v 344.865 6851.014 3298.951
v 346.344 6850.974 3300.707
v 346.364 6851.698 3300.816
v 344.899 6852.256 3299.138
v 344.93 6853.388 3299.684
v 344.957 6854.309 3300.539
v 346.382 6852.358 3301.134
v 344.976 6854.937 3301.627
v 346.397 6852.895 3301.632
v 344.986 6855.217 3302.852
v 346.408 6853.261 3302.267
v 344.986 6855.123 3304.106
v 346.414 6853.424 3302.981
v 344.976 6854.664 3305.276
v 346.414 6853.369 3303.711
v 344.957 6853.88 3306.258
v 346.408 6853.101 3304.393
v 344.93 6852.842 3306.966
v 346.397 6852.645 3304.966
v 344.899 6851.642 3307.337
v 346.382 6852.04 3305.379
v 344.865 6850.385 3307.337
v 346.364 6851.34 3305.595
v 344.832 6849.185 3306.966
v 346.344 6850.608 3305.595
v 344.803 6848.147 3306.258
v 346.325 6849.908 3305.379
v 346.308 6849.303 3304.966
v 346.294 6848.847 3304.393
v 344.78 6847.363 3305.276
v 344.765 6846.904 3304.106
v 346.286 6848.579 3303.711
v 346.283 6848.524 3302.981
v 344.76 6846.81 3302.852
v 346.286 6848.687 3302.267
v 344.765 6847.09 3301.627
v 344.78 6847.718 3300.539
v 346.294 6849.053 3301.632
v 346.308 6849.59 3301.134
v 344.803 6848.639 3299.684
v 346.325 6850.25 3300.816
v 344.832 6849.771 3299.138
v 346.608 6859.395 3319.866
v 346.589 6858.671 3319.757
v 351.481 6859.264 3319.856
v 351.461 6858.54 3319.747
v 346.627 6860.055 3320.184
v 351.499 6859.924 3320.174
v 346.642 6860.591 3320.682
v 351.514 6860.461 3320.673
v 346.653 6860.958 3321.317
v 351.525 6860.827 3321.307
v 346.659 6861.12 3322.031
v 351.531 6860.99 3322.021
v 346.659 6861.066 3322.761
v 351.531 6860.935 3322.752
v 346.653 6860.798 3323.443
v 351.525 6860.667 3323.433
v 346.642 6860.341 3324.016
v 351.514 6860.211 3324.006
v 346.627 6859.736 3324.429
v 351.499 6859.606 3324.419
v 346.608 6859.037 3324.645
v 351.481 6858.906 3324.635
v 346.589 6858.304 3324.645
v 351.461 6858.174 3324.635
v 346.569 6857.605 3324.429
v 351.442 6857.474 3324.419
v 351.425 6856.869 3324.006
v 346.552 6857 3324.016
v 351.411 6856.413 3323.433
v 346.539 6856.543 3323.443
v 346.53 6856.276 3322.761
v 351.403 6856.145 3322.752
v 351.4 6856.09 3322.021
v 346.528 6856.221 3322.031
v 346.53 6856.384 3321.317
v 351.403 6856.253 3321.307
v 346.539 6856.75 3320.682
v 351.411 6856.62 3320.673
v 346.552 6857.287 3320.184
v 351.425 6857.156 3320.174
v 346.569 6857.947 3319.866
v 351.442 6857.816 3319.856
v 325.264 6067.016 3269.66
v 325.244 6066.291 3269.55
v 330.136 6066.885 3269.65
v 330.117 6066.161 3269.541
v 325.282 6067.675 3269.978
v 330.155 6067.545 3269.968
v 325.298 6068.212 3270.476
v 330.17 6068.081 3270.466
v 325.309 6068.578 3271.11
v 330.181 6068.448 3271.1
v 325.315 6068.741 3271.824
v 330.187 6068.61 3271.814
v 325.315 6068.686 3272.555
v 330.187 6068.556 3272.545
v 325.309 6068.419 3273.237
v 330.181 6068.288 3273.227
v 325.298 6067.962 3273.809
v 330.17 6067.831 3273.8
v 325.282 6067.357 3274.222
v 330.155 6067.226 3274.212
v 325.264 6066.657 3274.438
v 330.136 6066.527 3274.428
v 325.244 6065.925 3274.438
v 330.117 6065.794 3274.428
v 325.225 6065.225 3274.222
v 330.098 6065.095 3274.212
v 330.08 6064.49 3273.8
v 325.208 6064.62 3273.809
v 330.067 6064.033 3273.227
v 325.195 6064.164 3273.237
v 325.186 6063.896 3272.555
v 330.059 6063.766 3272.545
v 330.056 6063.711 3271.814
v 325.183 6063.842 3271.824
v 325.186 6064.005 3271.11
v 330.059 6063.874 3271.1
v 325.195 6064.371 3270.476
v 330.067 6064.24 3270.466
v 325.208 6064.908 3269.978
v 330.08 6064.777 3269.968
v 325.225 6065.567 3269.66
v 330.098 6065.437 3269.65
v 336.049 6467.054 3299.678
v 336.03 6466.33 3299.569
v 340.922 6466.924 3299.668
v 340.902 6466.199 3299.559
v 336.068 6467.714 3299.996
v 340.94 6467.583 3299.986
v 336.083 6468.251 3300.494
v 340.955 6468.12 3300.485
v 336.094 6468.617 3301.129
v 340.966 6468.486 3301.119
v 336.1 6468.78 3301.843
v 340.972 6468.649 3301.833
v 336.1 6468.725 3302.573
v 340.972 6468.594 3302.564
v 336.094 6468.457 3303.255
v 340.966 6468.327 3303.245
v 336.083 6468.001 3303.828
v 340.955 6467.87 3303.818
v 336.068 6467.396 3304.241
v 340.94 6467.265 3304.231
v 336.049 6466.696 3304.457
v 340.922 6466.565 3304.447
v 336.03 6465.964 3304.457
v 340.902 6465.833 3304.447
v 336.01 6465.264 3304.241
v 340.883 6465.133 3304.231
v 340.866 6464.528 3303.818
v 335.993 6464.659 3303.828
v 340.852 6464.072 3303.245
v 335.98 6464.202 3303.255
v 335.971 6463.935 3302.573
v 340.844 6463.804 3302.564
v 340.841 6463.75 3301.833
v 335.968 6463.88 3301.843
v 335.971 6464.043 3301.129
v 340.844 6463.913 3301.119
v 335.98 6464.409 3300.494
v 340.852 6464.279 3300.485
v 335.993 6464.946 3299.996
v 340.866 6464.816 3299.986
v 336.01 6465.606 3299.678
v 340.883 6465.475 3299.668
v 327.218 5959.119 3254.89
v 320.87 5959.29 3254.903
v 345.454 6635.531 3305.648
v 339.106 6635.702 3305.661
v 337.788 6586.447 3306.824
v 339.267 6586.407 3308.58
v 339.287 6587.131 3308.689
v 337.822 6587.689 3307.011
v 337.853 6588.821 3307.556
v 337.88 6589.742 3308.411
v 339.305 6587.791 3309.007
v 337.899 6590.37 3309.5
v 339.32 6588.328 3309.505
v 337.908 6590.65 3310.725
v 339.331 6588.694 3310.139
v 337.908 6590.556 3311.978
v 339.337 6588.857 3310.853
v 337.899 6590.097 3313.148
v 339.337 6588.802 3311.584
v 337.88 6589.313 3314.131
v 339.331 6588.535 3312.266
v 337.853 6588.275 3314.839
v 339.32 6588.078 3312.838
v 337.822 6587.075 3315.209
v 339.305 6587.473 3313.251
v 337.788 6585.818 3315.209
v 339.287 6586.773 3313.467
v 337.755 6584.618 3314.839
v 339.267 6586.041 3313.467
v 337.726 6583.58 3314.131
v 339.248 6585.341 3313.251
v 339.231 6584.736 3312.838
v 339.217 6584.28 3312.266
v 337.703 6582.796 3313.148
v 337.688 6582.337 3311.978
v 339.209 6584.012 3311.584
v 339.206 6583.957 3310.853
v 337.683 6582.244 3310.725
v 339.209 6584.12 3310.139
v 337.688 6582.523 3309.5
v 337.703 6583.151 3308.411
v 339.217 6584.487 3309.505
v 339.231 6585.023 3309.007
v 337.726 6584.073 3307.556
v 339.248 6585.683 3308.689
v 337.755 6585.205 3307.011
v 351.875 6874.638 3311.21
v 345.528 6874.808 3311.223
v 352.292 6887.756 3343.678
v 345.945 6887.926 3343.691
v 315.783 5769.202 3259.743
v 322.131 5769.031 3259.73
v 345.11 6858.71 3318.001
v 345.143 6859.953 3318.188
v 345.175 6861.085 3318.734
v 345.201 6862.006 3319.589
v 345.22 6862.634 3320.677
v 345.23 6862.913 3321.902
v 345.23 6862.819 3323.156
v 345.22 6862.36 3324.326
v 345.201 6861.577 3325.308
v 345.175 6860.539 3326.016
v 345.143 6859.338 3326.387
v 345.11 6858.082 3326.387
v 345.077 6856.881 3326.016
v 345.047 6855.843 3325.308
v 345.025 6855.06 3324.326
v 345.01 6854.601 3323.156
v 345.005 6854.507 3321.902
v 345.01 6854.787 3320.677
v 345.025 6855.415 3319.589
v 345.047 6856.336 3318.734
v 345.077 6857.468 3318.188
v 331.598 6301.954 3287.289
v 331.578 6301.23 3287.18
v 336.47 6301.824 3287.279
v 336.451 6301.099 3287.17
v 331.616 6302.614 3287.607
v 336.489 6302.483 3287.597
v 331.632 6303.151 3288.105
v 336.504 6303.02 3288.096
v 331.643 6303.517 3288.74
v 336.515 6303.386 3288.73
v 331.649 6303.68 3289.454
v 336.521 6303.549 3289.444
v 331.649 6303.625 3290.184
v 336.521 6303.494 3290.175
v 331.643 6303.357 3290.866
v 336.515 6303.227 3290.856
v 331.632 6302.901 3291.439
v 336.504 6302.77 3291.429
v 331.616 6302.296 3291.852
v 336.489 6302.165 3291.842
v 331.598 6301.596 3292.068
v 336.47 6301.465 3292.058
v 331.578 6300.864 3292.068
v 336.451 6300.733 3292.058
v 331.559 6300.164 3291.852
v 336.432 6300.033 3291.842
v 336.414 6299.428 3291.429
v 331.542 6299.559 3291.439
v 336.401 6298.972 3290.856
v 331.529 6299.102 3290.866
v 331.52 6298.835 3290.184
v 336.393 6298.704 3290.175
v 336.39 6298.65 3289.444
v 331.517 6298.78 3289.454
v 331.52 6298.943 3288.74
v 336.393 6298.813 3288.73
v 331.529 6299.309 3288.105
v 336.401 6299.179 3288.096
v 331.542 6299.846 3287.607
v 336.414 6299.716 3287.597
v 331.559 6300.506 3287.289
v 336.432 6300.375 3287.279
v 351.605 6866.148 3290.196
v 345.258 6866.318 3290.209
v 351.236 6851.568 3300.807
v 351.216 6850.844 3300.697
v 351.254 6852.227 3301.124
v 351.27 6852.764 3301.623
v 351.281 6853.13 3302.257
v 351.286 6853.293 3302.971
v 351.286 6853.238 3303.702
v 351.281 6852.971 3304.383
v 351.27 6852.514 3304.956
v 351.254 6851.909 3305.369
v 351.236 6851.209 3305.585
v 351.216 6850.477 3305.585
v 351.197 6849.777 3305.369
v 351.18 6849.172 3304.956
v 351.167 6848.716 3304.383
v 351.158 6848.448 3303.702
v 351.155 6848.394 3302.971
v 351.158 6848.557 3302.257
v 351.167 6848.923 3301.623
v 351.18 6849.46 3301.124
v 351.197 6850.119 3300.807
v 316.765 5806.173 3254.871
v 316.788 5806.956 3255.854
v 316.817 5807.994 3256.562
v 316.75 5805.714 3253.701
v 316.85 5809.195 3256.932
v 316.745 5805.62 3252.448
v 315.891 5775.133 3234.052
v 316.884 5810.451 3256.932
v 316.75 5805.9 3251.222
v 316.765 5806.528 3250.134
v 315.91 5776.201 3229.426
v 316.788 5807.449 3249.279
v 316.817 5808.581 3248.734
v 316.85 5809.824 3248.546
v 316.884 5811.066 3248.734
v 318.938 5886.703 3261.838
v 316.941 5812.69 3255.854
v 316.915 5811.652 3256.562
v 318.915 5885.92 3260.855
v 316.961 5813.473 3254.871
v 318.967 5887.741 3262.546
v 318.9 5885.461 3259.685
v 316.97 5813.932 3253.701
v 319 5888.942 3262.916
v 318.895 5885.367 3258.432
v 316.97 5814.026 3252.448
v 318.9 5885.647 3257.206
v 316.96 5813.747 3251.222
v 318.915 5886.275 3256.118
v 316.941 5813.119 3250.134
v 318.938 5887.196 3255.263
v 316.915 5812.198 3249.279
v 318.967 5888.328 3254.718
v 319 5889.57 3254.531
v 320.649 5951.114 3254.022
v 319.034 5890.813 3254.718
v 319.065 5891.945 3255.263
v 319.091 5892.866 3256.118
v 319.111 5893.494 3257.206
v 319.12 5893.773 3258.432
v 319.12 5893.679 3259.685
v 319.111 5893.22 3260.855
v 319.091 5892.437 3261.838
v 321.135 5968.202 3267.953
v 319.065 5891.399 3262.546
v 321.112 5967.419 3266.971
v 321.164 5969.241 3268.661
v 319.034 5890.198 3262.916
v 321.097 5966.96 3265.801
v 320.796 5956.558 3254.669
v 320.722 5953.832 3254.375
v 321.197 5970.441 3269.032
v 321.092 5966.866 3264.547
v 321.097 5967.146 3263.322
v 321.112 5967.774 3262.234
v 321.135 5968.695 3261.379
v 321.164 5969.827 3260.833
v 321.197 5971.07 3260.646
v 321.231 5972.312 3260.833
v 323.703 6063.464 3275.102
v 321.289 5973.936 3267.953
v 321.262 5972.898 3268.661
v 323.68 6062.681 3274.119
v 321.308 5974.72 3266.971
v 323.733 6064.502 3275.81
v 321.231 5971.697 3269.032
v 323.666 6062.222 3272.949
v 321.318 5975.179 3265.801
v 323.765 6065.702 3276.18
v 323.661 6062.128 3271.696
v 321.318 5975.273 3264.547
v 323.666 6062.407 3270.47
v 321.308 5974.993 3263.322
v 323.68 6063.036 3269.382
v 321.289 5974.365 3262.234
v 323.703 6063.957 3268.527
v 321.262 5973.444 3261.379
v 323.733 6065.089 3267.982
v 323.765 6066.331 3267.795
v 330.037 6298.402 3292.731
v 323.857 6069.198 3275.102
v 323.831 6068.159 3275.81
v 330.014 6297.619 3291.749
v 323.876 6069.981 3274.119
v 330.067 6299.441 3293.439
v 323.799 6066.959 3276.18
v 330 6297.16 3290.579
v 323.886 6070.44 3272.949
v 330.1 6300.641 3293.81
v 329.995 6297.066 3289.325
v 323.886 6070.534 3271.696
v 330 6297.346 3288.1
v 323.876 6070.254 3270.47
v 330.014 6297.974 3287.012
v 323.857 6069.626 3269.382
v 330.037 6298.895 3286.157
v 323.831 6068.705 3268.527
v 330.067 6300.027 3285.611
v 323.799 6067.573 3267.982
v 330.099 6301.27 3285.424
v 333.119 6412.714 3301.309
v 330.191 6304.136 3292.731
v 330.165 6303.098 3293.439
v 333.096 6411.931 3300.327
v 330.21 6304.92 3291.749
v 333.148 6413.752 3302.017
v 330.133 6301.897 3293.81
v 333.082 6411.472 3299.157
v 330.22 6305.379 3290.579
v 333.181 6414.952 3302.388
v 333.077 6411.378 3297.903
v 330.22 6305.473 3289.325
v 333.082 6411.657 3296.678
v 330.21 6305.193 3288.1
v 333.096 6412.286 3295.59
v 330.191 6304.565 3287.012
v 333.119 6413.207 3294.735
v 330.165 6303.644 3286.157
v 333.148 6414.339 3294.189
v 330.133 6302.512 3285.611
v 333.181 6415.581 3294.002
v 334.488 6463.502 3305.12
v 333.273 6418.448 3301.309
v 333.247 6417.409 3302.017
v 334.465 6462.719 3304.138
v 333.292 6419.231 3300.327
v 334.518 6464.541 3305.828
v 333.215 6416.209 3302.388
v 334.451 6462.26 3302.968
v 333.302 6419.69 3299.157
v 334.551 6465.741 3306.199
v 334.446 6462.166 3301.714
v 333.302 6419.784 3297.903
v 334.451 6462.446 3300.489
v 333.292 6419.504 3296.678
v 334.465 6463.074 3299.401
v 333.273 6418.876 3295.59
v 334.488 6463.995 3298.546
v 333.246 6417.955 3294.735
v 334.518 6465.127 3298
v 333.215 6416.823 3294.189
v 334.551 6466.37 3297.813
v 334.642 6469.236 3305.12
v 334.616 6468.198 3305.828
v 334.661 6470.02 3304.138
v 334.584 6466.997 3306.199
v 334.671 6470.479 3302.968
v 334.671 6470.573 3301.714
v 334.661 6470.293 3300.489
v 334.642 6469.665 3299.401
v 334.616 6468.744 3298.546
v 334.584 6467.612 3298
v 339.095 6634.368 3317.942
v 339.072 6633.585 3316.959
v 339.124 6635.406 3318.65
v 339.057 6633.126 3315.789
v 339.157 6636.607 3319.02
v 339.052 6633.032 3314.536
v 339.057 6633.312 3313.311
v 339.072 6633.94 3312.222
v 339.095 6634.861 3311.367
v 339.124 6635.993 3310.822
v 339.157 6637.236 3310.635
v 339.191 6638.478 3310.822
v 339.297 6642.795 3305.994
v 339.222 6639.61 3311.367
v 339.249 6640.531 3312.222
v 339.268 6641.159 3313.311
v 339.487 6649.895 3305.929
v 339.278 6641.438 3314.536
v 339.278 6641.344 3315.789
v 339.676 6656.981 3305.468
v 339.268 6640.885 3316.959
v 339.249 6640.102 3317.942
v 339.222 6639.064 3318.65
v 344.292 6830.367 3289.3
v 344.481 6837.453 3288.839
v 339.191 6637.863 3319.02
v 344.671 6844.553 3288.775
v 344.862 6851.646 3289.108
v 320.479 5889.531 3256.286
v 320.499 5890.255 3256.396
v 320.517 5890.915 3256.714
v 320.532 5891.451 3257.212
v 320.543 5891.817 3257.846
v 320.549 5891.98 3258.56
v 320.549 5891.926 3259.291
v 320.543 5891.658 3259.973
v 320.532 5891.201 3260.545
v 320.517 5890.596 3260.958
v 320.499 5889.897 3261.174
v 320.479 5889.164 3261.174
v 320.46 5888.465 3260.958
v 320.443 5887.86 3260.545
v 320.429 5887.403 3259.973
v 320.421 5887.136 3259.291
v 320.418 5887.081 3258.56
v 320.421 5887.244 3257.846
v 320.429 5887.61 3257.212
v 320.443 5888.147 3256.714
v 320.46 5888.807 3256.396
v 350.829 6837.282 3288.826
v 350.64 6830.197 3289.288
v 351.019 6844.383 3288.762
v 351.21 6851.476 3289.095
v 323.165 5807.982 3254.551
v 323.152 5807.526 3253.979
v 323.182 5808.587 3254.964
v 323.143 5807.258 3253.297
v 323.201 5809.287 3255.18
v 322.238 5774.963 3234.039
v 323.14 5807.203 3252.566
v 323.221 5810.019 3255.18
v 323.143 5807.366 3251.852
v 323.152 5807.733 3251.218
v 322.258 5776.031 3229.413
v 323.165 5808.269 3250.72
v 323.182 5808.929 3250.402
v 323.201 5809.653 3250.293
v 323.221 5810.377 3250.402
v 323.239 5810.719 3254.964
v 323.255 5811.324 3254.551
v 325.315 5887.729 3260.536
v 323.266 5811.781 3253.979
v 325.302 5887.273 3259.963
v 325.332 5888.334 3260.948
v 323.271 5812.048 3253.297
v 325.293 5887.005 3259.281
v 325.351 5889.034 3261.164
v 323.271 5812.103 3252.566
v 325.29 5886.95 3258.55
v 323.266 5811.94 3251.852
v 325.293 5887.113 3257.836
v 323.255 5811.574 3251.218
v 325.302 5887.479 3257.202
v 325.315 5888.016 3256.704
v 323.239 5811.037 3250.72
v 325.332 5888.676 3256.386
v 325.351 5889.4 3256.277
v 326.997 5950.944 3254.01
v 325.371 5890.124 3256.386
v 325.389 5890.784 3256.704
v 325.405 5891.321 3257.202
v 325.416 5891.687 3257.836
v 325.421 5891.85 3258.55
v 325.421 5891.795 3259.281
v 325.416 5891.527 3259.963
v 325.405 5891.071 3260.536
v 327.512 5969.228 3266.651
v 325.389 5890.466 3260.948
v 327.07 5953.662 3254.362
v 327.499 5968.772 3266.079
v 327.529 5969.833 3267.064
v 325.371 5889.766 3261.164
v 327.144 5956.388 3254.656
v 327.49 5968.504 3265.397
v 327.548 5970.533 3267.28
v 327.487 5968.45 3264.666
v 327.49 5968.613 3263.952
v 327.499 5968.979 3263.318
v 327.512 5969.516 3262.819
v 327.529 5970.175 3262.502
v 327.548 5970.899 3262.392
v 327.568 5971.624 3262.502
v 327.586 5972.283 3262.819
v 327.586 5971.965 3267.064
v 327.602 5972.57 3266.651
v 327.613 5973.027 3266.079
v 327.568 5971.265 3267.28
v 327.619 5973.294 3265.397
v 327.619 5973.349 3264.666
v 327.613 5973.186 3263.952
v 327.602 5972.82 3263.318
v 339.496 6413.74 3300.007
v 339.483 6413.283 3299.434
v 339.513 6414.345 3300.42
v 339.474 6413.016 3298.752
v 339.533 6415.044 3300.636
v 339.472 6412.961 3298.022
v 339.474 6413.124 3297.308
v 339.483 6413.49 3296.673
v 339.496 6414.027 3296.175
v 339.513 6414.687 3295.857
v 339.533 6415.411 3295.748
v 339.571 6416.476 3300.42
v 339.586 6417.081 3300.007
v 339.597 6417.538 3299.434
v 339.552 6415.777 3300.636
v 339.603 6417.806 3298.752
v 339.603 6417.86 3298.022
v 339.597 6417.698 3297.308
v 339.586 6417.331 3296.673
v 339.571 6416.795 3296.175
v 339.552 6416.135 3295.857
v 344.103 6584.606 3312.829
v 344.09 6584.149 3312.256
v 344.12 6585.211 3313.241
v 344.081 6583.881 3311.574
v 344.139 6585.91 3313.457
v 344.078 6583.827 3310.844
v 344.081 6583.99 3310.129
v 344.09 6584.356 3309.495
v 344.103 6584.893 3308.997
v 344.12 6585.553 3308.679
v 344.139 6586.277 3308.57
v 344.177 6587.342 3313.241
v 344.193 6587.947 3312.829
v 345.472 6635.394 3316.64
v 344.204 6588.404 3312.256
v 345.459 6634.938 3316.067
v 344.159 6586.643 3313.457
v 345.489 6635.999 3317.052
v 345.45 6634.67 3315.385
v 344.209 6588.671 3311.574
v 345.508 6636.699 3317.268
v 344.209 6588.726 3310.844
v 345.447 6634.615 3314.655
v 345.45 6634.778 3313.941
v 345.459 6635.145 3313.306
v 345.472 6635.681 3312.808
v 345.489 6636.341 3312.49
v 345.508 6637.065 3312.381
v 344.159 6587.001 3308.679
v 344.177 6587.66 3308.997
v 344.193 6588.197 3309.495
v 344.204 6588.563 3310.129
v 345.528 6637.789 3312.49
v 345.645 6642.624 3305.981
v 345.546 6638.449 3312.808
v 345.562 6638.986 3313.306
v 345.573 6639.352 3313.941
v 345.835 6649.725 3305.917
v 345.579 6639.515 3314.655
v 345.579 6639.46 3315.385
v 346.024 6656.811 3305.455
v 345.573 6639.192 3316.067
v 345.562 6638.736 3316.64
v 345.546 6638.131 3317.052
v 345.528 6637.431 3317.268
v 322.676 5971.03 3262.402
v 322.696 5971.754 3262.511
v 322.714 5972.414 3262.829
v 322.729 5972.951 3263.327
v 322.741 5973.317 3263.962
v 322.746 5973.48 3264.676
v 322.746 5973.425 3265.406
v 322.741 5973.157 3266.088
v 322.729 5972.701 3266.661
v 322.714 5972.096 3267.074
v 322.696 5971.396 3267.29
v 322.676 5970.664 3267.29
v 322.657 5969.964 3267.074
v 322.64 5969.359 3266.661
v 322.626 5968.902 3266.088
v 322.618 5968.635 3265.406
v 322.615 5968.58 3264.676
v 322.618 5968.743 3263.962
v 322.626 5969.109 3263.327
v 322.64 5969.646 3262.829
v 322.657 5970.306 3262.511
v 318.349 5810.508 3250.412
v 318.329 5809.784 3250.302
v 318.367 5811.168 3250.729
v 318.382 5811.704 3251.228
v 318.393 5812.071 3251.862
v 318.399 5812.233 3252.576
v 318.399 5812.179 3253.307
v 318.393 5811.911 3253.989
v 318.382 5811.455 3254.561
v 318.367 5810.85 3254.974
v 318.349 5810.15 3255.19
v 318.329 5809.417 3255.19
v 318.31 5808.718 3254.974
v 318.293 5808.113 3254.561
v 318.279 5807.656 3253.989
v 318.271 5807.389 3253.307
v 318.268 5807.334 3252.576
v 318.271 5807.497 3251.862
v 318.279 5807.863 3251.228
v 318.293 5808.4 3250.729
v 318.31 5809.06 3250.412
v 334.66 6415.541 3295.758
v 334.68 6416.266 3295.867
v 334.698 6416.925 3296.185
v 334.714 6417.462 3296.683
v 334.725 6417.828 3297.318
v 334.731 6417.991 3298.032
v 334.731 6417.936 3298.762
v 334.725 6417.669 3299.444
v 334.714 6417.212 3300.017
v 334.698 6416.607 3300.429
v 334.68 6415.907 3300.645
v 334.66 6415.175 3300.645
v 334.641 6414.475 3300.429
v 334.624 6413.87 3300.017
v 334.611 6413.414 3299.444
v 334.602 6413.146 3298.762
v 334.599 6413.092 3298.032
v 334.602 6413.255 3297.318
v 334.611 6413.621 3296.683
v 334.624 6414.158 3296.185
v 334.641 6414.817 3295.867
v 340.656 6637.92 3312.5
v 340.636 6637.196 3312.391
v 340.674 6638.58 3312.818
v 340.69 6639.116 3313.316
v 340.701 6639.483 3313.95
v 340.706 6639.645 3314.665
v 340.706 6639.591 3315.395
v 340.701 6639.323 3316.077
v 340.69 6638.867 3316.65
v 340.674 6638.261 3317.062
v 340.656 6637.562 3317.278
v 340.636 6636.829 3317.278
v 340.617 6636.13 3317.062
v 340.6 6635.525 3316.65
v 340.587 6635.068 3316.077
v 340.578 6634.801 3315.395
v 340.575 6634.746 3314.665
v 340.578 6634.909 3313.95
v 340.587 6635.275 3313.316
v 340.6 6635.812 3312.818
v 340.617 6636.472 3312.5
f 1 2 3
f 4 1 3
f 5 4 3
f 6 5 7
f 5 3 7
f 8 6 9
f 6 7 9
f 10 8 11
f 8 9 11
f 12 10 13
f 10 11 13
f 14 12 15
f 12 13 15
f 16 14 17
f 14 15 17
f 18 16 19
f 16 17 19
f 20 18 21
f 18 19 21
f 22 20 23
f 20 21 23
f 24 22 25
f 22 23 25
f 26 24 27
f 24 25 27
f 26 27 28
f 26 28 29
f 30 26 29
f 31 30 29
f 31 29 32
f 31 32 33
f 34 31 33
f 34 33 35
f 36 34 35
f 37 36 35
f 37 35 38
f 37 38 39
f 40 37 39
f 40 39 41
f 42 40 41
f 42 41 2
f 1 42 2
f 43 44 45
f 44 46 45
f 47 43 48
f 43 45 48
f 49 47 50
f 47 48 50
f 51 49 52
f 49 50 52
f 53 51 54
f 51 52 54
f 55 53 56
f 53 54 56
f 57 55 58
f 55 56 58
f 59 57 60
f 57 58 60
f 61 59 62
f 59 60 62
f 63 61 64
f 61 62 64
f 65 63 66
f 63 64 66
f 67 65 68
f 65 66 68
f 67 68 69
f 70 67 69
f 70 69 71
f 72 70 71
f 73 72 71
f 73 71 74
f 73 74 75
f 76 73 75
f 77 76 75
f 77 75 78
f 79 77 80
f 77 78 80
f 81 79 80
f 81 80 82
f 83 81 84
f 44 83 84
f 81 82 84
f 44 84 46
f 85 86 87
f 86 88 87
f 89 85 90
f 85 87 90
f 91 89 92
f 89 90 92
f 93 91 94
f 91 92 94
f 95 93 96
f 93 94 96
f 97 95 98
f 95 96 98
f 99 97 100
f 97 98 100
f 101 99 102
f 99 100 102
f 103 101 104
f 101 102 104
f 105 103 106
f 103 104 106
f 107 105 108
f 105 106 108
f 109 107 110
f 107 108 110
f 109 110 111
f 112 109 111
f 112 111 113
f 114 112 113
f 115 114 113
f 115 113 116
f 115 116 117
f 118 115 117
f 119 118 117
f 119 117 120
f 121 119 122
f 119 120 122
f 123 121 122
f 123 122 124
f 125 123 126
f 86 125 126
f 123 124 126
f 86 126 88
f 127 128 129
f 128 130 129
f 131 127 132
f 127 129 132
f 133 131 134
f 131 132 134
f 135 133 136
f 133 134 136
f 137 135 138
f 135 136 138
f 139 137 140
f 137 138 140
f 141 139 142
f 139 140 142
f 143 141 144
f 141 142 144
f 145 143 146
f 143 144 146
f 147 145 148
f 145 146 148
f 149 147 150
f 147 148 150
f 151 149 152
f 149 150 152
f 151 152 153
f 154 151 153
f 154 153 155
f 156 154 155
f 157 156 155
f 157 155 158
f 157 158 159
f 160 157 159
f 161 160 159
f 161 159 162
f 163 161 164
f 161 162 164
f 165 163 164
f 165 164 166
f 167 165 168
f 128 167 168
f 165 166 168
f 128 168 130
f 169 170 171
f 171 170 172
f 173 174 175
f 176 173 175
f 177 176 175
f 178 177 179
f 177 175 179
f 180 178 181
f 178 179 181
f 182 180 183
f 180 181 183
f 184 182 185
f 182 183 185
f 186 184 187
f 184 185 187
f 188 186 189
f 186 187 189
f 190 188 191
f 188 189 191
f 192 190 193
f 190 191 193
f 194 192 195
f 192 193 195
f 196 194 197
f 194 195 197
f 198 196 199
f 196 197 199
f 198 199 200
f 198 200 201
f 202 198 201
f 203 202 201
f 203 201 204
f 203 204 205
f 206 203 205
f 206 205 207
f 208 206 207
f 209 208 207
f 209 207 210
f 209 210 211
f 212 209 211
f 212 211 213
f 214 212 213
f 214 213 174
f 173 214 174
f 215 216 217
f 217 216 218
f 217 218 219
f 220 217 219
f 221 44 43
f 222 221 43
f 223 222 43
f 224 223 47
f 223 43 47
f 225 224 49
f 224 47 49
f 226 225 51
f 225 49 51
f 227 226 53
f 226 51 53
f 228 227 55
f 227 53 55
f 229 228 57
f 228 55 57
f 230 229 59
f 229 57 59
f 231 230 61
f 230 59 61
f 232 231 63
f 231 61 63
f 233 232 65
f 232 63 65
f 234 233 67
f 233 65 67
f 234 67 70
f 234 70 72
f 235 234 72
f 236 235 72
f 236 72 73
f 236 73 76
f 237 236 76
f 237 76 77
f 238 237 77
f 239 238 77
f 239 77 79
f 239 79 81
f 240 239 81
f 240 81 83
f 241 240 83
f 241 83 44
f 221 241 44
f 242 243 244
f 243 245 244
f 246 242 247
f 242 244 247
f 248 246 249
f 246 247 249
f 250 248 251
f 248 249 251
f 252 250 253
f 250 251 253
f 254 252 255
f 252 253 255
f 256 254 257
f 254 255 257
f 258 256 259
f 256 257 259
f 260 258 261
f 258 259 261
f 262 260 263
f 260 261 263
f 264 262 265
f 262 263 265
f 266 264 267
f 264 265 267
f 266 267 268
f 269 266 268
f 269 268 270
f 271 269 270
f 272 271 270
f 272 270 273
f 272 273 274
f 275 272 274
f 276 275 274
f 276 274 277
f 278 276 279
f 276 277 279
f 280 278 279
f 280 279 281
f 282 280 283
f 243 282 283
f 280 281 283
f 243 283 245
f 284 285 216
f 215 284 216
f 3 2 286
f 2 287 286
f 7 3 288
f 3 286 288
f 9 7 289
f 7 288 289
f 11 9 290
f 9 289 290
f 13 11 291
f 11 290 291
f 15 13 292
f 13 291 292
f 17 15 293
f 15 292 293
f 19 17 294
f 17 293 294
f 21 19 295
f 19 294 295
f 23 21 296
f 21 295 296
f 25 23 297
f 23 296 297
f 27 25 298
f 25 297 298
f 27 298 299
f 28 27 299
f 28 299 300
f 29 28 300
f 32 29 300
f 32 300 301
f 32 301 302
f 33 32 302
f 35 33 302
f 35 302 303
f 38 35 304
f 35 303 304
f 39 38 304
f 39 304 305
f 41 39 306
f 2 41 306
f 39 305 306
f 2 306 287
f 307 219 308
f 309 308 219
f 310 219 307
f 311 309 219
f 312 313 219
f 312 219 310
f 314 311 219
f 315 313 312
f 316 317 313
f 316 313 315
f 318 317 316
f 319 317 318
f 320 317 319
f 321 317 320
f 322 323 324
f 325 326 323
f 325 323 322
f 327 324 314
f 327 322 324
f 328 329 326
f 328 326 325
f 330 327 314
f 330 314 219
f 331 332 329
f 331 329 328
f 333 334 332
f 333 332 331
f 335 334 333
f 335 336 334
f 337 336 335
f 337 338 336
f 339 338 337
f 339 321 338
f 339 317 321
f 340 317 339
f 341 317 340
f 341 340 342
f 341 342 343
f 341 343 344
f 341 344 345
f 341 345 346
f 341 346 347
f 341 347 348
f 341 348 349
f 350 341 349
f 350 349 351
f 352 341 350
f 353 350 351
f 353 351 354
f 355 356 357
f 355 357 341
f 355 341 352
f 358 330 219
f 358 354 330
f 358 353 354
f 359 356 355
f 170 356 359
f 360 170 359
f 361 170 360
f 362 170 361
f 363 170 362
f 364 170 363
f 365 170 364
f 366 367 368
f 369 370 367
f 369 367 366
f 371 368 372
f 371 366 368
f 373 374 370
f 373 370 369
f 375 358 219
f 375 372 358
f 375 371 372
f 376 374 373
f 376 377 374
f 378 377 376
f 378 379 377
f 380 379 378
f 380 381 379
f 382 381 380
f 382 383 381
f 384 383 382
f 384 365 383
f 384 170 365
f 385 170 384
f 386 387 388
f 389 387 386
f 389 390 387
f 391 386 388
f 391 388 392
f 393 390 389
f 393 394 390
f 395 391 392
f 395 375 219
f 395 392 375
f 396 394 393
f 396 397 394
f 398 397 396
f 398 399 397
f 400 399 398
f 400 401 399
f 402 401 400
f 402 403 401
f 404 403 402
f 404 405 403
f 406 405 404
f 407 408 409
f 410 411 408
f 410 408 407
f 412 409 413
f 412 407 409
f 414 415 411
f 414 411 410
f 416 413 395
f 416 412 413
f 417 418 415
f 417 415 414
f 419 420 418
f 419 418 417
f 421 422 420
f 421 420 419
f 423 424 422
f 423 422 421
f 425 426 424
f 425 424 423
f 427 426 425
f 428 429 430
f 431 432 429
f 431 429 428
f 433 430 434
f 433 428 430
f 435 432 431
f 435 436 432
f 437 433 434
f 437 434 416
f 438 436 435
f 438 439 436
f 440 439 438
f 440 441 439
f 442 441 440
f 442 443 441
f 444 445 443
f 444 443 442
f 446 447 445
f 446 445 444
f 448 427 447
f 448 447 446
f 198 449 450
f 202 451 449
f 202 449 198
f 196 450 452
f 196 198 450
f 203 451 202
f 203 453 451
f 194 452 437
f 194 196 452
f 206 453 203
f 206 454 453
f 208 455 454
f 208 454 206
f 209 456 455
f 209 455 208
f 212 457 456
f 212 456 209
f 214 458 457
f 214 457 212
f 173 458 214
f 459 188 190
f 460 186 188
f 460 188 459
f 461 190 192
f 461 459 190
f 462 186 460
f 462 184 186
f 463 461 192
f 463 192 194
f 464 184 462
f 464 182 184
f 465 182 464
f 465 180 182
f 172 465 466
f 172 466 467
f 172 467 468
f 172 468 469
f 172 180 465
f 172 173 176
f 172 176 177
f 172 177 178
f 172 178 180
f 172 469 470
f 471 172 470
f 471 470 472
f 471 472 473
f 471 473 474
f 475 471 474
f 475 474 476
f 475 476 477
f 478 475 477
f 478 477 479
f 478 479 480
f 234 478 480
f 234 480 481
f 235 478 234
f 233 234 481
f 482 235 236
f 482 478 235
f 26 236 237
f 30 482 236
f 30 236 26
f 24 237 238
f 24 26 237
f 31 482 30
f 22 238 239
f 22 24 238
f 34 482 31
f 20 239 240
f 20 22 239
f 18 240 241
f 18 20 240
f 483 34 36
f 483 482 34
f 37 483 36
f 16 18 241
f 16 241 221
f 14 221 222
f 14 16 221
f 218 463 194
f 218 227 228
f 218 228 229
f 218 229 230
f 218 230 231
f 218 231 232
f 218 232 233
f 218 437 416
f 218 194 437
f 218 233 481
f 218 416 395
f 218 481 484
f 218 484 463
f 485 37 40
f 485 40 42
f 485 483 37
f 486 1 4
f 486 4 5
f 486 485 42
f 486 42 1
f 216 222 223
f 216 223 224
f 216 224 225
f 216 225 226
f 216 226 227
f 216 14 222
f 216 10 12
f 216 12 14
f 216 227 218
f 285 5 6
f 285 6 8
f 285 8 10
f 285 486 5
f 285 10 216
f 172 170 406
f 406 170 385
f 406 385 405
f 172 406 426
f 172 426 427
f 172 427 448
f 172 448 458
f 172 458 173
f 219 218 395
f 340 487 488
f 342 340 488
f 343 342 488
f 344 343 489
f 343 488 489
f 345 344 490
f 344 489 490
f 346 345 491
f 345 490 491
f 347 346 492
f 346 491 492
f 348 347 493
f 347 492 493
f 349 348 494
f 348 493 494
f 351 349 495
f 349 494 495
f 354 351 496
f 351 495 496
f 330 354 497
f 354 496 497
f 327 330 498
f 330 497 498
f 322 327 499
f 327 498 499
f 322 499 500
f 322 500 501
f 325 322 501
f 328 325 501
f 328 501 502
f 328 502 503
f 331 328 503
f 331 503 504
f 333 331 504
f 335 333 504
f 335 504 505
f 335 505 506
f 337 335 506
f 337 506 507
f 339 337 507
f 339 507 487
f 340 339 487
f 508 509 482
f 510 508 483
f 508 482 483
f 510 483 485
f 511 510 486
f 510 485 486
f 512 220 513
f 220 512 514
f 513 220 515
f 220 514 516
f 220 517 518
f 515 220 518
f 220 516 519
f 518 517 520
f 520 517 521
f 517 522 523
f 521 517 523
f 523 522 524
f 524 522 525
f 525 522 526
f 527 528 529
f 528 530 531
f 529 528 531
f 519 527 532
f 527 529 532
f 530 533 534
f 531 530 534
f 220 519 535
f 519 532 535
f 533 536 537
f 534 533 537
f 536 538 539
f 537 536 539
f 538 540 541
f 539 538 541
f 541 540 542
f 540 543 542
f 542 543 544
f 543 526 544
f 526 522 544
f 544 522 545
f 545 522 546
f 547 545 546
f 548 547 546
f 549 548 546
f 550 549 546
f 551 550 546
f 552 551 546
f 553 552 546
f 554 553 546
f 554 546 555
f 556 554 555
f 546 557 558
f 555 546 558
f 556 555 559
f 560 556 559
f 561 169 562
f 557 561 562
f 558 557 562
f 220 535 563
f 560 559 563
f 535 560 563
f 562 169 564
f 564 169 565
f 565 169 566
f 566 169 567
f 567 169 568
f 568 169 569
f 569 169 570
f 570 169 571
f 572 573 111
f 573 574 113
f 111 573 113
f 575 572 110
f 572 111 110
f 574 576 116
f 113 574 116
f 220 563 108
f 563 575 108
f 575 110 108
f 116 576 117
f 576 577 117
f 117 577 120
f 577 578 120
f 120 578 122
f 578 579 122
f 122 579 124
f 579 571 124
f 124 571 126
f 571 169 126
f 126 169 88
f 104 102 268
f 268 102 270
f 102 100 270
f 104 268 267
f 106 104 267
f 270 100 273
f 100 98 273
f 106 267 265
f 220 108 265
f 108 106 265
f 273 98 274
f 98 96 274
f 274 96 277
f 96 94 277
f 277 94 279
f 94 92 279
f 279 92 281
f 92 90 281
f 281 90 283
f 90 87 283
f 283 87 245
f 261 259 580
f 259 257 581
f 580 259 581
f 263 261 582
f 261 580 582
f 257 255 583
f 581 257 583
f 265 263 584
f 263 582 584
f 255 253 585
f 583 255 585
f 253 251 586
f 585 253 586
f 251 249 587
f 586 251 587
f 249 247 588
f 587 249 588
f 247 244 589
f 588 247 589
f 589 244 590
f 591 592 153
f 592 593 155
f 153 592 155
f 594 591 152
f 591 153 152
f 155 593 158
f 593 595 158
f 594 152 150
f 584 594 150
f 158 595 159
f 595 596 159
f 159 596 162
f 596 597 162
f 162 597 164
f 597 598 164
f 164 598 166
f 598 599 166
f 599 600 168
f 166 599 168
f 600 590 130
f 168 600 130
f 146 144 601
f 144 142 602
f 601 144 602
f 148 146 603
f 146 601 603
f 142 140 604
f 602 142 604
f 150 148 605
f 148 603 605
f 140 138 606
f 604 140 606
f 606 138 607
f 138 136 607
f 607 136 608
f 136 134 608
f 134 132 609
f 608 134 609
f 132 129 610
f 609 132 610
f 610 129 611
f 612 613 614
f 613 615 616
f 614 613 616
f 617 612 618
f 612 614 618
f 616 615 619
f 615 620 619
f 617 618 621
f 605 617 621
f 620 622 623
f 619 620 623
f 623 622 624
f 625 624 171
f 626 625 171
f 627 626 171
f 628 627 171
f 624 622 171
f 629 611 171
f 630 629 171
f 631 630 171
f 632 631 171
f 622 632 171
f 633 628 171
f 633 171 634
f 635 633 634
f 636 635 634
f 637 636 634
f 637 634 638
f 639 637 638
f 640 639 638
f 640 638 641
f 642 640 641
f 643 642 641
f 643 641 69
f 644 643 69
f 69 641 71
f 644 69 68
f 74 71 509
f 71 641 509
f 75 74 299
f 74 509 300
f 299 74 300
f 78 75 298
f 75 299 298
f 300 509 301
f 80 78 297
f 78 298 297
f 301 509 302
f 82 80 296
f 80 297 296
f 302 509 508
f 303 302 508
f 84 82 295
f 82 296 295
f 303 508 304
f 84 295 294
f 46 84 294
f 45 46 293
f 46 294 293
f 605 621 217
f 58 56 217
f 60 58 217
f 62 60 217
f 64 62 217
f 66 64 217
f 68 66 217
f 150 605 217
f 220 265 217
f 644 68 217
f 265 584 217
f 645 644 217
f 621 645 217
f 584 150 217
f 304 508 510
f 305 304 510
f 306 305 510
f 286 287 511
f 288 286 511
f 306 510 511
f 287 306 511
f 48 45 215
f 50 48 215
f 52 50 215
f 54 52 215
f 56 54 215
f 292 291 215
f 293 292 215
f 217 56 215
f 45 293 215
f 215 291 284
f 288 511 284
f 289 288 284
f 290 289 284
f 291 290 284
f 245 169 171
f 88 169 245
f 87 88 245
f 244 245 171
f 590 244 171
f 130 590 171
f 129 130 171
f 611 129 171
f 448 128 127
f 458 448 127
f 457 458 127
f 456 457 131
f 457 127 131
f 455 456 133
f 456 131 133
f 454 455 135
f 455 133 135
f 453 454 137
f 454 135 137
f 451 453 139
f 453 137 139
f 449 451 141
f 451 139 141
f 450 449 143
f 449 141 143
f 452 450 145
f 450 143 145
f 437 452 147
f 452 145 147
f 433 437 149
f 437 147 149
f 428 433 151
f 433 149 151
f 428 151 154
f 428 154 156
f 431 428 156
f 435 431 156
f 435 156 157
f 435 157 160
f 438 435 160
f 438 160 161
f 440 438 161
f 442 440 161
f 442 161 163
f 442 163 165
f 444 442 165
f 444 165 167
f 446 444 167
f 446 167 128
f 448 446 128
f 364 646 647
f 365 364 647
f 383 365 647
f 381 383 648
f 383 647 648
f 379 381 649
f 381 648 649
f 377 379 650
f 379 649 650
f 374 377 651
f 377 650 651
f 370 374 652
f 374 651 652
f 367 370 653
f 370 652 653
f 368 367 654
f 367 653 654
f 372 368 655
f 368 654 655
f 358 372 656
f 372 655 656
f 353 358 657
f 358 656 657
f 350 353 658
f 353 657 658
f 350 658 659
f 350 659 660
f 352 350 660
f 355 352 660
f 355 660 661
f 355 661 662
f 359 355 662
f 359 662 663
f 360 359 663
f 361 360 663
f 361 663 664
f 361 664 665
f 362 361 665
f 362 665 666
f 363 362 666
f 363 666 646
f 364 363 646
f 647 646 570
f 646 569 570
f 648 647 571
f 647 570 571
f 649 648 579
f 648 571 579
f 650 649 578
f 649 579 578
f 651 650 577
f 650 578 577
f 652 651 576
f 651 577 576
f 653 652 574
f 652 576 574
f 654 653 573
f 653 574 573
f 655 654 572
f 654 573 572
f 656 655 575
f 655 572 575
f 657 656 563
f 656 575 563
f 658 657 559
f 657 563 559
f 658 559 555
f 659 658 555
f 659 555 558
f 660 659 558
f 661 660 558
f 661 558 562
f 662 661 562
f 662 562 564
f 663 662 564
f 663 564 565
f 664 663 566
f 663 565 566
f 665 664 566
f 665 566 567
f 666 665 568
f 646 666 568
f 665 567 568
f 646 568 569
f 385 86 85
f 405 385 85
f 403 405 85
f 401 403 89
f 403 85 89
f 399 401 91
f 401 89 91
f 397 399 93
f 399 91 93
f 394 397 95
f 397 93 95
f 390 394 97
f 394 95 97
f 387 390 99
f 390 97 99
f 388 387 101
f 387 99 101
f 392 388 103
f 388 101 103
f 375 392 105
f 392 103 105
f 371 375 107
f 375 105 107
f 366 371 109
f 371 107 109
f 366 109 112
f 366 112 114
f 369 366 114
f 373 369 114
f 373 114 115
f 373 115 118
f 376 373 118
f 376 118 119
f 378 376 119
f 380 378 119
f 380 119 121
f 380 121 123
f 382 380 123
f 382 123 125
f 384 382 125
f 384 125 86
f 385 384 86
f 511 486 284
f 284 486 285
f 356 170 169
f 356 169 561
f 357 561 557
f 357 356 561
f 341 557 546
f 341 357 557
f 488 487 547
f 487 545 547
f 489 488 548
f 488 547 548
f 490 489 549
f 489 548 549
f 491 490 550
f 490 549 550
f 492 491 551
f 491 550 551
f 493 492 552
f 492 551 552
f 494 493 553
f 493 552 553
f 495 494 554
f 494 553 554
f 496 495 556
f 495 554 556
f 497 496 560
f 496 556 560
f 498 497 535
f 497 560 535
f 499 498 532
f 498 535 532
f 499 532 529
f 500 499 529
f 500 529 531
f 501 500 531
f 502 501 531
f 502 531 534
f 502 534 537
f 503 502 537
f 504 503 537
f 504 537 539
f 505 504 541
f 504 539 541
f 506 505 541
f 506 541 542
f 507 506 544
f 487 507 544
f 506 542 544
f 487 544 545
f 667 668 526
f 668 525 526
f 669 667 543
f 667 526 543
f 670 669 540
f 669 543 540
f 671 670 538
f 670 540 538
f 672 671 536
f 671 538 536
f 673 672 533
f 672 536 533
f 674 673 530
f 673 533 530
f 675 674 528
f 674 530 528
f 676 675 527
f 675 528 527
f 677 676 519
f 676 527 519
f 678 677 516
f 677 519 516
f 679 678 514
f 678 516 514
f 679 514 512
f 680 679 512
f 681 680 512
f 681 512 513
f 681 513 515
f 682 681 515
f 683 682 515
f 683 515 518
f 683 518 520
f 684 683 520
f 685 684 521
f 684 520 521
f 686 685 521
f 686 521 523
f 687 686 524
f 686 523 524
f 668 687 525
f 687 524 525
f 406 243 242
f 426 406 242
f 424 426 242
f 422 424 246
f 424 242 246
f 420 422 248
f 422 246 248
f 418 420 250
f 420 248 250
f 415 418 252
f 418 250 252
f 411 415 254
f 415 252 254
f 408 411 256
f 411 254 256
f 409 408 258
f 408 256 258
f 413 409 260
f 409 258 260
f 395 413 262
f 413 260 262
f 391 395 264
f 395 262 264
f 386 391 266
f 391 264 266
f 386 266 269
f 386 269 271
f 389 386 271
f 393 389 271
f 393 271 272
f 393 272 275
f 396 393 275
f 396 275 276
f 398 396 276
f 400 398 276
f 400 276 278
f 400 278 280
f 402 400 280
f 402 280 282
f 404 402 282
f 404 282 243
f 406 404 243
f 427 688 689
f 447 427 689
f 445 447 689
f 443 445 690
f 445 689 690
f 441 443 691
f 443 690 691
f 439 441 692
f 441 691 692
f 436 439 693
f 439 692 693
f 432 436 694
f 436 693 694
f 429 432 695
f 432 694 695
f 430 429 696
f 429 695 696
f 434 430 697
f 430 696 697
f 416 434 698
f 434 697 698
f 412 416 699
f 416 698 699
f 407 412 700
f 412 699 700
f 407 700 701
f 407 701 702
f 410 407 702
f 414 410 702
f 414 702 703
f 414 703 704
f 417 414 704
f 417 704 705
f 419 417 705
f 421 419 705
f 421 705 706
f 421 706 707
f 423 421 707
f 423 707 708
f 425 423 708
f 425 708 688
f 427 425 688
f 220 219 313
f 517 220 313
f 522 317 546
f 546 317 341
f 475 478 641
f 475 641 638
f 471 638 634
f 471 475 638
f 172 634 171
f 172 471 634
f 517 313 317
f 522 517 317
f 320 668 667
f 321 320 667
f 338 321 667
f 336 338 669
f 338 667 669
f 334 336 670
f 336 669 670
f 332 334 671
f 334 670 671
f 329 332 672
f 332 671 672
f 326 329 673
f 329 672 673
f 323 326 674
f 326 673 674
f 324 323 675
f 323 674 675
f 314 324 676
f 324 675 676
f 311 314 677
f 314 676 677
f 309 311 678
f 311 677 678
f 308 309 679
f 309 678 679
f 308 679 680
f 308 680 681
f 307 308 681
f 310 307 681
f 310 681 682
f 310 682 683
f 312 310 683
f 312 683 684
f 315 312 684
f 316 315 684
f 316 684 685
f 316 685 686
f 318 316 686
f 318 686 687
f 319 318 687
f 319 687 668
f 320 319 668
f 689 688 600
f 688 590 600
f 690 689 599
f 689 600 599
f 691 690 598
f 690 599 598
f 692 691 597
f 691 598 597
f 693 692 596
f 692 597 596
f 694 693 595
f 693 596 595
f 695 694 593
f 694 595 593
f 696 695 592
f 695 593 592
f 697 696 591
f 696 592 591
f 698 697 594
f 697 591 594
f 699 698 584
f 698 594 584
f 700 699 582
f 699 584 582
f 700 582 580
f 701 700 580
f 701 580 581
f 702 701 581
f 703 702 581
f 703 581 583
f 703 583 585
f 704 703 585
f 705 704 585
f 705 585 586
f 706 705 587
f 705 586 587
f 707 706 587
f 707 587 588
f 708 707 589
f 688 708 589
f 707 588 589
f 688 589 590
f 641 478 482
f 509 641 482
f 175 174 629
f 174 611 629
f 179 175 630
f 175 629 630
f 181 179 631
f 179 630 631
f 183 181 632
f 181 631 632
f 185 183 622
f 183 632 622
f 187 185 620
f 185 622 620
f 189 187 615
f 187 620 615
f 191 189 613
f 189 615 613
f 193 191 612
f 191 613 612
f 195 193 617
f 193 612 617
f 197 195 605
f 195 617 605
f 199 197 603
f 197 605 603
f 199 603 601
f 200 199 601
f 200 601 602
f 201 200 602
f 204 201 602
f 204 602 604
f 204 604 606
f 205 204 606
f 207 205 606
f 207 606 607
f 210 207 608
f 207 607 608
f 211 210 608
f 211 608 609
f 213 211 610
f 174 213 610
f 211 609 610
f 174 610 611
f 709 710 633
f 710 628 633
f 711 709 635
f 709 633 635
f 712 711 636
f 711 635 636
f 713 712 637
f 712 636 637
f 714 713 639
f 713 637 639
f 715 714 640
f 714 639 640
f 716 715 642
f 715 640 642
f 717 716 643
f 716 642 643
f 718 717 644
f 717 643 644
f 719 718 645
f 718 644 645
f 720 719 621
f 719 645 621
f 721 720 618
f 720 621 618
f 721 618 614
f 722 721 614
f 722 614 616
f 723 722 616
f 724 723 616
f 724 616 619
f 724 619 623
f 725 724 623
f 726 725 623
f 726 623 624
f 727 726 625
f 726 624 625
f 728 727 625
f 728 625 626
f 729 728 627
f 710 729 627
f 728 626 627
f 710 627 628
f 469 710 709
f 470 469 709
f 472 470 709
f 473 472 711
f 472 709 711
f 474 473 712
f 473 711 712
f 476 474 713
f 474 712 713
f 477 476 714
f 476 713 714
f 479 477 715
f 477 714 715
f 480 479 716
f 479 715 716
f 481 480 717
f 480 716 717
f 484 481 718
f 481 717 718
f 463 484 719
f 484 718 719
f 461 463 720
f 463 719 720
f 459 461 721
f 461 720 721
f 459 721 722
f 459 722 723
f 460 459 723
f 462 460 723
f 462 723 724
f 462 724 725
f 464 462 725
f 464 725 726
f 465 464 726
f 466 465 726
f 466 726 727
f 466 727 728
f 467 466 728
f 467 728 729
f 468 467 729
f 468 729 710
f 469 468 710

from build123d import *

# Parameters (mm, degrees)
STOCK_LEFT_START                                  = 154.501049255
STOCK_LEFT_CONSOLE_1_OUTLINE_R                    = 2.413
STOCK_LEFT_CONSOLE_1_DEPTH                        = 6.35
SKETCH1_R                                         = 2.413
BOSS_EXTRUDE1_DEPTH                               = 6.35
FILLET1_R                                         = 127
CSK_FOR_8_FLAT_HEAD_MACHINE_SCREW_100_D           = 4.9149
CSK_FOR_8_FLAT_HEAD_MACHINE_SCREW_100_DEPTH       = 36.56137815
CSK_FOR_8_FLAT_HEAD_MACHINE_SCREW_100_CSINK_D     = 8.4328
CSK_FOR_8_FLAT_HEAD_MACHINE_SCREW_100_CSINK_ANGLE = 100


# Read off the part's stored shape, not the designer's step: Stock-Left Console-1
with BuildPart() as part:
    # Stock-Left Console-1 outline → Stock-Left Console-1 (new body)
    with BuildSketch(Plane(origin=(0, 0, 0), x_dir=(0.02679964301193732, 0.9996408236099973, -5.391436833640836e-05), z_dir=(0.999638800759929, -0.0267996972431853, -0.00201103031422956)).offset(STOCK_LEFT_START)):
        Polygon((6894.543157626, 3344.380142713), (5775.416554865, 3260.371330561), (5781.349946418, 3234.680487062), (5961.468932714, 3260.009915697), (6652.879217668, 3311.911600999), (6881.420614343, 3311.911600999), align=None)
        with Locations((5816.052887601, 3253.393618776)):
            Circle(STOCK_LEFT_CONSOLE_1_OUTLINE_R, mode=Mode.SUBTRACT)
        with Locations((5895.828437121, 3259.382082581)):
            Circle(STOCK_LEFT_CONSOLE_1_OUTLINE_R, mode=Mode.SUBTRACT)
        with Locations((5977.356983496, 3265.50213756)):
            Circle(STOCK_LEFT_CONSOLE_1_OUTLINE_R, mode=Mode.SUBTRACT)
        with Locations((6072.652614823, 3272.65563813)):
            Circle(STOCK_LEFT_CONSOLE_1_OUTLINE_R, mode=Mode.SUBTRACT)
        with Locations((6307.675625814, 3290.29797094)):
            Circle(STOCK_LEFT_CONSOLE_1_OUTLINE_R, mode=Mode.SUBTRACT)
        with Locations((6422.028102237, 3298.882000385)):
            Circle(STOCK_LEFT_CONSOLE_1_OUTLINE_R, mode=Mode.SUBTRACT)
        with Locations((6472.834946762, 3302.695887614)):
            Circle(STOCK_LEFT_CONSOLE_1_OUTLINE_R, mode=Mode.SUBTRACT)
        with Locations((6592.955295229, 3311.712890485)):
            Circle(STOCK_LEFT_CONSOLE_1_OUTLINE_R, mode=Mode.SUBTRACT)
        with Locations((6643.762139775, 3315.526777715)):
            Circle(STOCK_LEFT_CONSOLE_1_OUTLINE_R, mode=Mode.SUBTRACT)
        with Locations((6865.316700097, 3322.905070324)):
            Circle(STOCK_LEFT_CONSOLE_1_OUTLINE_R, mode=Mode.SUBTRACT)
    extrude(amount=STOCK_LEFT_CONSOLE_1_DEPTH)

    # Sketch1 → Boss-Extrude1 (add)
    with BuildSketch(Plane(origin=(154.445243594, -4.140581344, -0.310706294), x_dir=(0.002010307996697838, -5.389511255073478e-05, 0.9999979778764931), z_dir=(-0.9996388007599293, 0.026799697243176115, 0.0020110303142280403))):
        Polygon((3259.688501477, 5961.644685781), (3234.3687839, 5781.524334123), (3229.743043385, 5782.592402631), (3254.912621388, 5961.644685781), (3306.77702959, 6653.057767982), (3288.626337955, 6847.775838873), (3290.526309625, 6873.104678319), (3311.540587989, 6881.599164324), (3311.552909679, 6653.057767982), align=None)
        with Locations(Location((3303.484925533, 6857.795366229, 0), (0, 0, 270))):
            Circle(SKETCH1_R, mode=Mode.SUBTRACT)
    extrude(amount=-BOSS_EXTRUDE1_DEPTH)

    # Fillet1
    # the kernel refuses this fillet: 127 mm, written as the material it adds along each edge
    with BuildSketch(Plane(origin=(320.759216191, 5955.187389877, 3254.595333259), x_dir=(-0.026818667254060527, -0.9899007533718392, -0.13920221823153914), z_dir=(0.9996388007599292, -0.026799697243176112, -0.00201103031422804))) as fillet1_piece_1:
        with BuildLine():
            CenterArc((FILLET1_R * 0.0324033639177, FILLET1_R), FILLET1_R, 266.288146769, 3.711853231)
            Line((-FILLET1_R * 0.0323353896511, FILLET1_R * 0.00209775339147), (0, 0))
            Line((0, 0), (FILLET1_R * 0.0324033639177, 0))
        make_face()
    extrude(amount=6.35)
    with BuildSketch(Plane(origin=(339.393178368, 6646.349336581, 3306.459636585), x_dir=(-0.02687504446974266, -0.9968362003292489, -0.07480188298361883), z_dir=(0.9996388007599292, -0.026799697243176112, -0.00201103031422804))) as fillet1_piece_2:
        with BuildLine():
            CenterArc((FILLET1_R * 0.0841067955983, FILLET1_R), FILLET1_R, 260.38470128, 9.61529872)
            Line((-FILLET1_R * 0.0829252189667, FILLET1_R * 0.0140485275074), (0, 0))
            Line((0, 0), (FILLET1_R * 0.0841067955983, 0))
        make_face()
    extrude(amount=6.35)
    # the kernel refuses this fillet: 127 mm, written as the material it takes off along each edge
    with BuildSketch(Plane(origin=(317.880823616, 6841.714103927, 3288.36268402), x_dir=(0.026875044469742655, 0.996836200329251, 0.0748018829835892), z_dir=(0.9996388007599292, -0.026799697243176112, -0.00201103031422804))) as fillet1_2_piece_1:
        with BuildLine():
            CenterArc((FILLET1_R * 0.0841067955983, FILLET1_R), FILLET1_R, 260.38470128, 9.61529872)
            Line((-FILLET1_R * 0.0829252189667, FILLET1_R * 0.0140485275074), (0, 0))
            Line((0, 0), (FILLET1_R * 0.0841067955982, 0))
        make_face()
    extrude(amount=59.757815205, mode=Mode.SUBTRACT)

    # CSK for #8 Flat Head Machine Screw (100)1
    with Locations(Plane(origin=(154.445243594, -4.140581344, -0.310706294), x_dir=(0.002010307996697838, -5.389511255073478e-05, 0.9999979778764931), z_dir=(-0.9996388007599293, 0.026799697243176115, 0.0020110303142280403))):
        with Locations((3322.534925533, 6865.49584281), (3303.484925533, 6857.795366229), (3315.168577933, 6643.940885012), (3311.357429933, 6593.133834917), (3302.346903301, 6473.013000478), (3298.535755302, 6422.205950402), (3289.957891123, 6307.853011342), (3272.328229482, 6072.829049515), (3265.179866736, 5977.533032649), (3259.064207335, 5896.004156434), (3253.080044595, 5816.228284164)):
            CounterSinkHole(CSK_FOR_8_FLAT_HEAD_MACHINE_SCREW_100_D / 2, CSK_FOR_8_FLAT_HEAD_MACHINE_SCREW_100_CSINK_D / 2, depth=CSK_FOR_8_FLAT_HEAD_MACHINE_SCREW_100_DEPTH, counter_sink_angle=CSK_FOR_8_FLAT_HEAD_MACHINE_SCREW_100_CSINK_ANGLE)


solid = part.part
